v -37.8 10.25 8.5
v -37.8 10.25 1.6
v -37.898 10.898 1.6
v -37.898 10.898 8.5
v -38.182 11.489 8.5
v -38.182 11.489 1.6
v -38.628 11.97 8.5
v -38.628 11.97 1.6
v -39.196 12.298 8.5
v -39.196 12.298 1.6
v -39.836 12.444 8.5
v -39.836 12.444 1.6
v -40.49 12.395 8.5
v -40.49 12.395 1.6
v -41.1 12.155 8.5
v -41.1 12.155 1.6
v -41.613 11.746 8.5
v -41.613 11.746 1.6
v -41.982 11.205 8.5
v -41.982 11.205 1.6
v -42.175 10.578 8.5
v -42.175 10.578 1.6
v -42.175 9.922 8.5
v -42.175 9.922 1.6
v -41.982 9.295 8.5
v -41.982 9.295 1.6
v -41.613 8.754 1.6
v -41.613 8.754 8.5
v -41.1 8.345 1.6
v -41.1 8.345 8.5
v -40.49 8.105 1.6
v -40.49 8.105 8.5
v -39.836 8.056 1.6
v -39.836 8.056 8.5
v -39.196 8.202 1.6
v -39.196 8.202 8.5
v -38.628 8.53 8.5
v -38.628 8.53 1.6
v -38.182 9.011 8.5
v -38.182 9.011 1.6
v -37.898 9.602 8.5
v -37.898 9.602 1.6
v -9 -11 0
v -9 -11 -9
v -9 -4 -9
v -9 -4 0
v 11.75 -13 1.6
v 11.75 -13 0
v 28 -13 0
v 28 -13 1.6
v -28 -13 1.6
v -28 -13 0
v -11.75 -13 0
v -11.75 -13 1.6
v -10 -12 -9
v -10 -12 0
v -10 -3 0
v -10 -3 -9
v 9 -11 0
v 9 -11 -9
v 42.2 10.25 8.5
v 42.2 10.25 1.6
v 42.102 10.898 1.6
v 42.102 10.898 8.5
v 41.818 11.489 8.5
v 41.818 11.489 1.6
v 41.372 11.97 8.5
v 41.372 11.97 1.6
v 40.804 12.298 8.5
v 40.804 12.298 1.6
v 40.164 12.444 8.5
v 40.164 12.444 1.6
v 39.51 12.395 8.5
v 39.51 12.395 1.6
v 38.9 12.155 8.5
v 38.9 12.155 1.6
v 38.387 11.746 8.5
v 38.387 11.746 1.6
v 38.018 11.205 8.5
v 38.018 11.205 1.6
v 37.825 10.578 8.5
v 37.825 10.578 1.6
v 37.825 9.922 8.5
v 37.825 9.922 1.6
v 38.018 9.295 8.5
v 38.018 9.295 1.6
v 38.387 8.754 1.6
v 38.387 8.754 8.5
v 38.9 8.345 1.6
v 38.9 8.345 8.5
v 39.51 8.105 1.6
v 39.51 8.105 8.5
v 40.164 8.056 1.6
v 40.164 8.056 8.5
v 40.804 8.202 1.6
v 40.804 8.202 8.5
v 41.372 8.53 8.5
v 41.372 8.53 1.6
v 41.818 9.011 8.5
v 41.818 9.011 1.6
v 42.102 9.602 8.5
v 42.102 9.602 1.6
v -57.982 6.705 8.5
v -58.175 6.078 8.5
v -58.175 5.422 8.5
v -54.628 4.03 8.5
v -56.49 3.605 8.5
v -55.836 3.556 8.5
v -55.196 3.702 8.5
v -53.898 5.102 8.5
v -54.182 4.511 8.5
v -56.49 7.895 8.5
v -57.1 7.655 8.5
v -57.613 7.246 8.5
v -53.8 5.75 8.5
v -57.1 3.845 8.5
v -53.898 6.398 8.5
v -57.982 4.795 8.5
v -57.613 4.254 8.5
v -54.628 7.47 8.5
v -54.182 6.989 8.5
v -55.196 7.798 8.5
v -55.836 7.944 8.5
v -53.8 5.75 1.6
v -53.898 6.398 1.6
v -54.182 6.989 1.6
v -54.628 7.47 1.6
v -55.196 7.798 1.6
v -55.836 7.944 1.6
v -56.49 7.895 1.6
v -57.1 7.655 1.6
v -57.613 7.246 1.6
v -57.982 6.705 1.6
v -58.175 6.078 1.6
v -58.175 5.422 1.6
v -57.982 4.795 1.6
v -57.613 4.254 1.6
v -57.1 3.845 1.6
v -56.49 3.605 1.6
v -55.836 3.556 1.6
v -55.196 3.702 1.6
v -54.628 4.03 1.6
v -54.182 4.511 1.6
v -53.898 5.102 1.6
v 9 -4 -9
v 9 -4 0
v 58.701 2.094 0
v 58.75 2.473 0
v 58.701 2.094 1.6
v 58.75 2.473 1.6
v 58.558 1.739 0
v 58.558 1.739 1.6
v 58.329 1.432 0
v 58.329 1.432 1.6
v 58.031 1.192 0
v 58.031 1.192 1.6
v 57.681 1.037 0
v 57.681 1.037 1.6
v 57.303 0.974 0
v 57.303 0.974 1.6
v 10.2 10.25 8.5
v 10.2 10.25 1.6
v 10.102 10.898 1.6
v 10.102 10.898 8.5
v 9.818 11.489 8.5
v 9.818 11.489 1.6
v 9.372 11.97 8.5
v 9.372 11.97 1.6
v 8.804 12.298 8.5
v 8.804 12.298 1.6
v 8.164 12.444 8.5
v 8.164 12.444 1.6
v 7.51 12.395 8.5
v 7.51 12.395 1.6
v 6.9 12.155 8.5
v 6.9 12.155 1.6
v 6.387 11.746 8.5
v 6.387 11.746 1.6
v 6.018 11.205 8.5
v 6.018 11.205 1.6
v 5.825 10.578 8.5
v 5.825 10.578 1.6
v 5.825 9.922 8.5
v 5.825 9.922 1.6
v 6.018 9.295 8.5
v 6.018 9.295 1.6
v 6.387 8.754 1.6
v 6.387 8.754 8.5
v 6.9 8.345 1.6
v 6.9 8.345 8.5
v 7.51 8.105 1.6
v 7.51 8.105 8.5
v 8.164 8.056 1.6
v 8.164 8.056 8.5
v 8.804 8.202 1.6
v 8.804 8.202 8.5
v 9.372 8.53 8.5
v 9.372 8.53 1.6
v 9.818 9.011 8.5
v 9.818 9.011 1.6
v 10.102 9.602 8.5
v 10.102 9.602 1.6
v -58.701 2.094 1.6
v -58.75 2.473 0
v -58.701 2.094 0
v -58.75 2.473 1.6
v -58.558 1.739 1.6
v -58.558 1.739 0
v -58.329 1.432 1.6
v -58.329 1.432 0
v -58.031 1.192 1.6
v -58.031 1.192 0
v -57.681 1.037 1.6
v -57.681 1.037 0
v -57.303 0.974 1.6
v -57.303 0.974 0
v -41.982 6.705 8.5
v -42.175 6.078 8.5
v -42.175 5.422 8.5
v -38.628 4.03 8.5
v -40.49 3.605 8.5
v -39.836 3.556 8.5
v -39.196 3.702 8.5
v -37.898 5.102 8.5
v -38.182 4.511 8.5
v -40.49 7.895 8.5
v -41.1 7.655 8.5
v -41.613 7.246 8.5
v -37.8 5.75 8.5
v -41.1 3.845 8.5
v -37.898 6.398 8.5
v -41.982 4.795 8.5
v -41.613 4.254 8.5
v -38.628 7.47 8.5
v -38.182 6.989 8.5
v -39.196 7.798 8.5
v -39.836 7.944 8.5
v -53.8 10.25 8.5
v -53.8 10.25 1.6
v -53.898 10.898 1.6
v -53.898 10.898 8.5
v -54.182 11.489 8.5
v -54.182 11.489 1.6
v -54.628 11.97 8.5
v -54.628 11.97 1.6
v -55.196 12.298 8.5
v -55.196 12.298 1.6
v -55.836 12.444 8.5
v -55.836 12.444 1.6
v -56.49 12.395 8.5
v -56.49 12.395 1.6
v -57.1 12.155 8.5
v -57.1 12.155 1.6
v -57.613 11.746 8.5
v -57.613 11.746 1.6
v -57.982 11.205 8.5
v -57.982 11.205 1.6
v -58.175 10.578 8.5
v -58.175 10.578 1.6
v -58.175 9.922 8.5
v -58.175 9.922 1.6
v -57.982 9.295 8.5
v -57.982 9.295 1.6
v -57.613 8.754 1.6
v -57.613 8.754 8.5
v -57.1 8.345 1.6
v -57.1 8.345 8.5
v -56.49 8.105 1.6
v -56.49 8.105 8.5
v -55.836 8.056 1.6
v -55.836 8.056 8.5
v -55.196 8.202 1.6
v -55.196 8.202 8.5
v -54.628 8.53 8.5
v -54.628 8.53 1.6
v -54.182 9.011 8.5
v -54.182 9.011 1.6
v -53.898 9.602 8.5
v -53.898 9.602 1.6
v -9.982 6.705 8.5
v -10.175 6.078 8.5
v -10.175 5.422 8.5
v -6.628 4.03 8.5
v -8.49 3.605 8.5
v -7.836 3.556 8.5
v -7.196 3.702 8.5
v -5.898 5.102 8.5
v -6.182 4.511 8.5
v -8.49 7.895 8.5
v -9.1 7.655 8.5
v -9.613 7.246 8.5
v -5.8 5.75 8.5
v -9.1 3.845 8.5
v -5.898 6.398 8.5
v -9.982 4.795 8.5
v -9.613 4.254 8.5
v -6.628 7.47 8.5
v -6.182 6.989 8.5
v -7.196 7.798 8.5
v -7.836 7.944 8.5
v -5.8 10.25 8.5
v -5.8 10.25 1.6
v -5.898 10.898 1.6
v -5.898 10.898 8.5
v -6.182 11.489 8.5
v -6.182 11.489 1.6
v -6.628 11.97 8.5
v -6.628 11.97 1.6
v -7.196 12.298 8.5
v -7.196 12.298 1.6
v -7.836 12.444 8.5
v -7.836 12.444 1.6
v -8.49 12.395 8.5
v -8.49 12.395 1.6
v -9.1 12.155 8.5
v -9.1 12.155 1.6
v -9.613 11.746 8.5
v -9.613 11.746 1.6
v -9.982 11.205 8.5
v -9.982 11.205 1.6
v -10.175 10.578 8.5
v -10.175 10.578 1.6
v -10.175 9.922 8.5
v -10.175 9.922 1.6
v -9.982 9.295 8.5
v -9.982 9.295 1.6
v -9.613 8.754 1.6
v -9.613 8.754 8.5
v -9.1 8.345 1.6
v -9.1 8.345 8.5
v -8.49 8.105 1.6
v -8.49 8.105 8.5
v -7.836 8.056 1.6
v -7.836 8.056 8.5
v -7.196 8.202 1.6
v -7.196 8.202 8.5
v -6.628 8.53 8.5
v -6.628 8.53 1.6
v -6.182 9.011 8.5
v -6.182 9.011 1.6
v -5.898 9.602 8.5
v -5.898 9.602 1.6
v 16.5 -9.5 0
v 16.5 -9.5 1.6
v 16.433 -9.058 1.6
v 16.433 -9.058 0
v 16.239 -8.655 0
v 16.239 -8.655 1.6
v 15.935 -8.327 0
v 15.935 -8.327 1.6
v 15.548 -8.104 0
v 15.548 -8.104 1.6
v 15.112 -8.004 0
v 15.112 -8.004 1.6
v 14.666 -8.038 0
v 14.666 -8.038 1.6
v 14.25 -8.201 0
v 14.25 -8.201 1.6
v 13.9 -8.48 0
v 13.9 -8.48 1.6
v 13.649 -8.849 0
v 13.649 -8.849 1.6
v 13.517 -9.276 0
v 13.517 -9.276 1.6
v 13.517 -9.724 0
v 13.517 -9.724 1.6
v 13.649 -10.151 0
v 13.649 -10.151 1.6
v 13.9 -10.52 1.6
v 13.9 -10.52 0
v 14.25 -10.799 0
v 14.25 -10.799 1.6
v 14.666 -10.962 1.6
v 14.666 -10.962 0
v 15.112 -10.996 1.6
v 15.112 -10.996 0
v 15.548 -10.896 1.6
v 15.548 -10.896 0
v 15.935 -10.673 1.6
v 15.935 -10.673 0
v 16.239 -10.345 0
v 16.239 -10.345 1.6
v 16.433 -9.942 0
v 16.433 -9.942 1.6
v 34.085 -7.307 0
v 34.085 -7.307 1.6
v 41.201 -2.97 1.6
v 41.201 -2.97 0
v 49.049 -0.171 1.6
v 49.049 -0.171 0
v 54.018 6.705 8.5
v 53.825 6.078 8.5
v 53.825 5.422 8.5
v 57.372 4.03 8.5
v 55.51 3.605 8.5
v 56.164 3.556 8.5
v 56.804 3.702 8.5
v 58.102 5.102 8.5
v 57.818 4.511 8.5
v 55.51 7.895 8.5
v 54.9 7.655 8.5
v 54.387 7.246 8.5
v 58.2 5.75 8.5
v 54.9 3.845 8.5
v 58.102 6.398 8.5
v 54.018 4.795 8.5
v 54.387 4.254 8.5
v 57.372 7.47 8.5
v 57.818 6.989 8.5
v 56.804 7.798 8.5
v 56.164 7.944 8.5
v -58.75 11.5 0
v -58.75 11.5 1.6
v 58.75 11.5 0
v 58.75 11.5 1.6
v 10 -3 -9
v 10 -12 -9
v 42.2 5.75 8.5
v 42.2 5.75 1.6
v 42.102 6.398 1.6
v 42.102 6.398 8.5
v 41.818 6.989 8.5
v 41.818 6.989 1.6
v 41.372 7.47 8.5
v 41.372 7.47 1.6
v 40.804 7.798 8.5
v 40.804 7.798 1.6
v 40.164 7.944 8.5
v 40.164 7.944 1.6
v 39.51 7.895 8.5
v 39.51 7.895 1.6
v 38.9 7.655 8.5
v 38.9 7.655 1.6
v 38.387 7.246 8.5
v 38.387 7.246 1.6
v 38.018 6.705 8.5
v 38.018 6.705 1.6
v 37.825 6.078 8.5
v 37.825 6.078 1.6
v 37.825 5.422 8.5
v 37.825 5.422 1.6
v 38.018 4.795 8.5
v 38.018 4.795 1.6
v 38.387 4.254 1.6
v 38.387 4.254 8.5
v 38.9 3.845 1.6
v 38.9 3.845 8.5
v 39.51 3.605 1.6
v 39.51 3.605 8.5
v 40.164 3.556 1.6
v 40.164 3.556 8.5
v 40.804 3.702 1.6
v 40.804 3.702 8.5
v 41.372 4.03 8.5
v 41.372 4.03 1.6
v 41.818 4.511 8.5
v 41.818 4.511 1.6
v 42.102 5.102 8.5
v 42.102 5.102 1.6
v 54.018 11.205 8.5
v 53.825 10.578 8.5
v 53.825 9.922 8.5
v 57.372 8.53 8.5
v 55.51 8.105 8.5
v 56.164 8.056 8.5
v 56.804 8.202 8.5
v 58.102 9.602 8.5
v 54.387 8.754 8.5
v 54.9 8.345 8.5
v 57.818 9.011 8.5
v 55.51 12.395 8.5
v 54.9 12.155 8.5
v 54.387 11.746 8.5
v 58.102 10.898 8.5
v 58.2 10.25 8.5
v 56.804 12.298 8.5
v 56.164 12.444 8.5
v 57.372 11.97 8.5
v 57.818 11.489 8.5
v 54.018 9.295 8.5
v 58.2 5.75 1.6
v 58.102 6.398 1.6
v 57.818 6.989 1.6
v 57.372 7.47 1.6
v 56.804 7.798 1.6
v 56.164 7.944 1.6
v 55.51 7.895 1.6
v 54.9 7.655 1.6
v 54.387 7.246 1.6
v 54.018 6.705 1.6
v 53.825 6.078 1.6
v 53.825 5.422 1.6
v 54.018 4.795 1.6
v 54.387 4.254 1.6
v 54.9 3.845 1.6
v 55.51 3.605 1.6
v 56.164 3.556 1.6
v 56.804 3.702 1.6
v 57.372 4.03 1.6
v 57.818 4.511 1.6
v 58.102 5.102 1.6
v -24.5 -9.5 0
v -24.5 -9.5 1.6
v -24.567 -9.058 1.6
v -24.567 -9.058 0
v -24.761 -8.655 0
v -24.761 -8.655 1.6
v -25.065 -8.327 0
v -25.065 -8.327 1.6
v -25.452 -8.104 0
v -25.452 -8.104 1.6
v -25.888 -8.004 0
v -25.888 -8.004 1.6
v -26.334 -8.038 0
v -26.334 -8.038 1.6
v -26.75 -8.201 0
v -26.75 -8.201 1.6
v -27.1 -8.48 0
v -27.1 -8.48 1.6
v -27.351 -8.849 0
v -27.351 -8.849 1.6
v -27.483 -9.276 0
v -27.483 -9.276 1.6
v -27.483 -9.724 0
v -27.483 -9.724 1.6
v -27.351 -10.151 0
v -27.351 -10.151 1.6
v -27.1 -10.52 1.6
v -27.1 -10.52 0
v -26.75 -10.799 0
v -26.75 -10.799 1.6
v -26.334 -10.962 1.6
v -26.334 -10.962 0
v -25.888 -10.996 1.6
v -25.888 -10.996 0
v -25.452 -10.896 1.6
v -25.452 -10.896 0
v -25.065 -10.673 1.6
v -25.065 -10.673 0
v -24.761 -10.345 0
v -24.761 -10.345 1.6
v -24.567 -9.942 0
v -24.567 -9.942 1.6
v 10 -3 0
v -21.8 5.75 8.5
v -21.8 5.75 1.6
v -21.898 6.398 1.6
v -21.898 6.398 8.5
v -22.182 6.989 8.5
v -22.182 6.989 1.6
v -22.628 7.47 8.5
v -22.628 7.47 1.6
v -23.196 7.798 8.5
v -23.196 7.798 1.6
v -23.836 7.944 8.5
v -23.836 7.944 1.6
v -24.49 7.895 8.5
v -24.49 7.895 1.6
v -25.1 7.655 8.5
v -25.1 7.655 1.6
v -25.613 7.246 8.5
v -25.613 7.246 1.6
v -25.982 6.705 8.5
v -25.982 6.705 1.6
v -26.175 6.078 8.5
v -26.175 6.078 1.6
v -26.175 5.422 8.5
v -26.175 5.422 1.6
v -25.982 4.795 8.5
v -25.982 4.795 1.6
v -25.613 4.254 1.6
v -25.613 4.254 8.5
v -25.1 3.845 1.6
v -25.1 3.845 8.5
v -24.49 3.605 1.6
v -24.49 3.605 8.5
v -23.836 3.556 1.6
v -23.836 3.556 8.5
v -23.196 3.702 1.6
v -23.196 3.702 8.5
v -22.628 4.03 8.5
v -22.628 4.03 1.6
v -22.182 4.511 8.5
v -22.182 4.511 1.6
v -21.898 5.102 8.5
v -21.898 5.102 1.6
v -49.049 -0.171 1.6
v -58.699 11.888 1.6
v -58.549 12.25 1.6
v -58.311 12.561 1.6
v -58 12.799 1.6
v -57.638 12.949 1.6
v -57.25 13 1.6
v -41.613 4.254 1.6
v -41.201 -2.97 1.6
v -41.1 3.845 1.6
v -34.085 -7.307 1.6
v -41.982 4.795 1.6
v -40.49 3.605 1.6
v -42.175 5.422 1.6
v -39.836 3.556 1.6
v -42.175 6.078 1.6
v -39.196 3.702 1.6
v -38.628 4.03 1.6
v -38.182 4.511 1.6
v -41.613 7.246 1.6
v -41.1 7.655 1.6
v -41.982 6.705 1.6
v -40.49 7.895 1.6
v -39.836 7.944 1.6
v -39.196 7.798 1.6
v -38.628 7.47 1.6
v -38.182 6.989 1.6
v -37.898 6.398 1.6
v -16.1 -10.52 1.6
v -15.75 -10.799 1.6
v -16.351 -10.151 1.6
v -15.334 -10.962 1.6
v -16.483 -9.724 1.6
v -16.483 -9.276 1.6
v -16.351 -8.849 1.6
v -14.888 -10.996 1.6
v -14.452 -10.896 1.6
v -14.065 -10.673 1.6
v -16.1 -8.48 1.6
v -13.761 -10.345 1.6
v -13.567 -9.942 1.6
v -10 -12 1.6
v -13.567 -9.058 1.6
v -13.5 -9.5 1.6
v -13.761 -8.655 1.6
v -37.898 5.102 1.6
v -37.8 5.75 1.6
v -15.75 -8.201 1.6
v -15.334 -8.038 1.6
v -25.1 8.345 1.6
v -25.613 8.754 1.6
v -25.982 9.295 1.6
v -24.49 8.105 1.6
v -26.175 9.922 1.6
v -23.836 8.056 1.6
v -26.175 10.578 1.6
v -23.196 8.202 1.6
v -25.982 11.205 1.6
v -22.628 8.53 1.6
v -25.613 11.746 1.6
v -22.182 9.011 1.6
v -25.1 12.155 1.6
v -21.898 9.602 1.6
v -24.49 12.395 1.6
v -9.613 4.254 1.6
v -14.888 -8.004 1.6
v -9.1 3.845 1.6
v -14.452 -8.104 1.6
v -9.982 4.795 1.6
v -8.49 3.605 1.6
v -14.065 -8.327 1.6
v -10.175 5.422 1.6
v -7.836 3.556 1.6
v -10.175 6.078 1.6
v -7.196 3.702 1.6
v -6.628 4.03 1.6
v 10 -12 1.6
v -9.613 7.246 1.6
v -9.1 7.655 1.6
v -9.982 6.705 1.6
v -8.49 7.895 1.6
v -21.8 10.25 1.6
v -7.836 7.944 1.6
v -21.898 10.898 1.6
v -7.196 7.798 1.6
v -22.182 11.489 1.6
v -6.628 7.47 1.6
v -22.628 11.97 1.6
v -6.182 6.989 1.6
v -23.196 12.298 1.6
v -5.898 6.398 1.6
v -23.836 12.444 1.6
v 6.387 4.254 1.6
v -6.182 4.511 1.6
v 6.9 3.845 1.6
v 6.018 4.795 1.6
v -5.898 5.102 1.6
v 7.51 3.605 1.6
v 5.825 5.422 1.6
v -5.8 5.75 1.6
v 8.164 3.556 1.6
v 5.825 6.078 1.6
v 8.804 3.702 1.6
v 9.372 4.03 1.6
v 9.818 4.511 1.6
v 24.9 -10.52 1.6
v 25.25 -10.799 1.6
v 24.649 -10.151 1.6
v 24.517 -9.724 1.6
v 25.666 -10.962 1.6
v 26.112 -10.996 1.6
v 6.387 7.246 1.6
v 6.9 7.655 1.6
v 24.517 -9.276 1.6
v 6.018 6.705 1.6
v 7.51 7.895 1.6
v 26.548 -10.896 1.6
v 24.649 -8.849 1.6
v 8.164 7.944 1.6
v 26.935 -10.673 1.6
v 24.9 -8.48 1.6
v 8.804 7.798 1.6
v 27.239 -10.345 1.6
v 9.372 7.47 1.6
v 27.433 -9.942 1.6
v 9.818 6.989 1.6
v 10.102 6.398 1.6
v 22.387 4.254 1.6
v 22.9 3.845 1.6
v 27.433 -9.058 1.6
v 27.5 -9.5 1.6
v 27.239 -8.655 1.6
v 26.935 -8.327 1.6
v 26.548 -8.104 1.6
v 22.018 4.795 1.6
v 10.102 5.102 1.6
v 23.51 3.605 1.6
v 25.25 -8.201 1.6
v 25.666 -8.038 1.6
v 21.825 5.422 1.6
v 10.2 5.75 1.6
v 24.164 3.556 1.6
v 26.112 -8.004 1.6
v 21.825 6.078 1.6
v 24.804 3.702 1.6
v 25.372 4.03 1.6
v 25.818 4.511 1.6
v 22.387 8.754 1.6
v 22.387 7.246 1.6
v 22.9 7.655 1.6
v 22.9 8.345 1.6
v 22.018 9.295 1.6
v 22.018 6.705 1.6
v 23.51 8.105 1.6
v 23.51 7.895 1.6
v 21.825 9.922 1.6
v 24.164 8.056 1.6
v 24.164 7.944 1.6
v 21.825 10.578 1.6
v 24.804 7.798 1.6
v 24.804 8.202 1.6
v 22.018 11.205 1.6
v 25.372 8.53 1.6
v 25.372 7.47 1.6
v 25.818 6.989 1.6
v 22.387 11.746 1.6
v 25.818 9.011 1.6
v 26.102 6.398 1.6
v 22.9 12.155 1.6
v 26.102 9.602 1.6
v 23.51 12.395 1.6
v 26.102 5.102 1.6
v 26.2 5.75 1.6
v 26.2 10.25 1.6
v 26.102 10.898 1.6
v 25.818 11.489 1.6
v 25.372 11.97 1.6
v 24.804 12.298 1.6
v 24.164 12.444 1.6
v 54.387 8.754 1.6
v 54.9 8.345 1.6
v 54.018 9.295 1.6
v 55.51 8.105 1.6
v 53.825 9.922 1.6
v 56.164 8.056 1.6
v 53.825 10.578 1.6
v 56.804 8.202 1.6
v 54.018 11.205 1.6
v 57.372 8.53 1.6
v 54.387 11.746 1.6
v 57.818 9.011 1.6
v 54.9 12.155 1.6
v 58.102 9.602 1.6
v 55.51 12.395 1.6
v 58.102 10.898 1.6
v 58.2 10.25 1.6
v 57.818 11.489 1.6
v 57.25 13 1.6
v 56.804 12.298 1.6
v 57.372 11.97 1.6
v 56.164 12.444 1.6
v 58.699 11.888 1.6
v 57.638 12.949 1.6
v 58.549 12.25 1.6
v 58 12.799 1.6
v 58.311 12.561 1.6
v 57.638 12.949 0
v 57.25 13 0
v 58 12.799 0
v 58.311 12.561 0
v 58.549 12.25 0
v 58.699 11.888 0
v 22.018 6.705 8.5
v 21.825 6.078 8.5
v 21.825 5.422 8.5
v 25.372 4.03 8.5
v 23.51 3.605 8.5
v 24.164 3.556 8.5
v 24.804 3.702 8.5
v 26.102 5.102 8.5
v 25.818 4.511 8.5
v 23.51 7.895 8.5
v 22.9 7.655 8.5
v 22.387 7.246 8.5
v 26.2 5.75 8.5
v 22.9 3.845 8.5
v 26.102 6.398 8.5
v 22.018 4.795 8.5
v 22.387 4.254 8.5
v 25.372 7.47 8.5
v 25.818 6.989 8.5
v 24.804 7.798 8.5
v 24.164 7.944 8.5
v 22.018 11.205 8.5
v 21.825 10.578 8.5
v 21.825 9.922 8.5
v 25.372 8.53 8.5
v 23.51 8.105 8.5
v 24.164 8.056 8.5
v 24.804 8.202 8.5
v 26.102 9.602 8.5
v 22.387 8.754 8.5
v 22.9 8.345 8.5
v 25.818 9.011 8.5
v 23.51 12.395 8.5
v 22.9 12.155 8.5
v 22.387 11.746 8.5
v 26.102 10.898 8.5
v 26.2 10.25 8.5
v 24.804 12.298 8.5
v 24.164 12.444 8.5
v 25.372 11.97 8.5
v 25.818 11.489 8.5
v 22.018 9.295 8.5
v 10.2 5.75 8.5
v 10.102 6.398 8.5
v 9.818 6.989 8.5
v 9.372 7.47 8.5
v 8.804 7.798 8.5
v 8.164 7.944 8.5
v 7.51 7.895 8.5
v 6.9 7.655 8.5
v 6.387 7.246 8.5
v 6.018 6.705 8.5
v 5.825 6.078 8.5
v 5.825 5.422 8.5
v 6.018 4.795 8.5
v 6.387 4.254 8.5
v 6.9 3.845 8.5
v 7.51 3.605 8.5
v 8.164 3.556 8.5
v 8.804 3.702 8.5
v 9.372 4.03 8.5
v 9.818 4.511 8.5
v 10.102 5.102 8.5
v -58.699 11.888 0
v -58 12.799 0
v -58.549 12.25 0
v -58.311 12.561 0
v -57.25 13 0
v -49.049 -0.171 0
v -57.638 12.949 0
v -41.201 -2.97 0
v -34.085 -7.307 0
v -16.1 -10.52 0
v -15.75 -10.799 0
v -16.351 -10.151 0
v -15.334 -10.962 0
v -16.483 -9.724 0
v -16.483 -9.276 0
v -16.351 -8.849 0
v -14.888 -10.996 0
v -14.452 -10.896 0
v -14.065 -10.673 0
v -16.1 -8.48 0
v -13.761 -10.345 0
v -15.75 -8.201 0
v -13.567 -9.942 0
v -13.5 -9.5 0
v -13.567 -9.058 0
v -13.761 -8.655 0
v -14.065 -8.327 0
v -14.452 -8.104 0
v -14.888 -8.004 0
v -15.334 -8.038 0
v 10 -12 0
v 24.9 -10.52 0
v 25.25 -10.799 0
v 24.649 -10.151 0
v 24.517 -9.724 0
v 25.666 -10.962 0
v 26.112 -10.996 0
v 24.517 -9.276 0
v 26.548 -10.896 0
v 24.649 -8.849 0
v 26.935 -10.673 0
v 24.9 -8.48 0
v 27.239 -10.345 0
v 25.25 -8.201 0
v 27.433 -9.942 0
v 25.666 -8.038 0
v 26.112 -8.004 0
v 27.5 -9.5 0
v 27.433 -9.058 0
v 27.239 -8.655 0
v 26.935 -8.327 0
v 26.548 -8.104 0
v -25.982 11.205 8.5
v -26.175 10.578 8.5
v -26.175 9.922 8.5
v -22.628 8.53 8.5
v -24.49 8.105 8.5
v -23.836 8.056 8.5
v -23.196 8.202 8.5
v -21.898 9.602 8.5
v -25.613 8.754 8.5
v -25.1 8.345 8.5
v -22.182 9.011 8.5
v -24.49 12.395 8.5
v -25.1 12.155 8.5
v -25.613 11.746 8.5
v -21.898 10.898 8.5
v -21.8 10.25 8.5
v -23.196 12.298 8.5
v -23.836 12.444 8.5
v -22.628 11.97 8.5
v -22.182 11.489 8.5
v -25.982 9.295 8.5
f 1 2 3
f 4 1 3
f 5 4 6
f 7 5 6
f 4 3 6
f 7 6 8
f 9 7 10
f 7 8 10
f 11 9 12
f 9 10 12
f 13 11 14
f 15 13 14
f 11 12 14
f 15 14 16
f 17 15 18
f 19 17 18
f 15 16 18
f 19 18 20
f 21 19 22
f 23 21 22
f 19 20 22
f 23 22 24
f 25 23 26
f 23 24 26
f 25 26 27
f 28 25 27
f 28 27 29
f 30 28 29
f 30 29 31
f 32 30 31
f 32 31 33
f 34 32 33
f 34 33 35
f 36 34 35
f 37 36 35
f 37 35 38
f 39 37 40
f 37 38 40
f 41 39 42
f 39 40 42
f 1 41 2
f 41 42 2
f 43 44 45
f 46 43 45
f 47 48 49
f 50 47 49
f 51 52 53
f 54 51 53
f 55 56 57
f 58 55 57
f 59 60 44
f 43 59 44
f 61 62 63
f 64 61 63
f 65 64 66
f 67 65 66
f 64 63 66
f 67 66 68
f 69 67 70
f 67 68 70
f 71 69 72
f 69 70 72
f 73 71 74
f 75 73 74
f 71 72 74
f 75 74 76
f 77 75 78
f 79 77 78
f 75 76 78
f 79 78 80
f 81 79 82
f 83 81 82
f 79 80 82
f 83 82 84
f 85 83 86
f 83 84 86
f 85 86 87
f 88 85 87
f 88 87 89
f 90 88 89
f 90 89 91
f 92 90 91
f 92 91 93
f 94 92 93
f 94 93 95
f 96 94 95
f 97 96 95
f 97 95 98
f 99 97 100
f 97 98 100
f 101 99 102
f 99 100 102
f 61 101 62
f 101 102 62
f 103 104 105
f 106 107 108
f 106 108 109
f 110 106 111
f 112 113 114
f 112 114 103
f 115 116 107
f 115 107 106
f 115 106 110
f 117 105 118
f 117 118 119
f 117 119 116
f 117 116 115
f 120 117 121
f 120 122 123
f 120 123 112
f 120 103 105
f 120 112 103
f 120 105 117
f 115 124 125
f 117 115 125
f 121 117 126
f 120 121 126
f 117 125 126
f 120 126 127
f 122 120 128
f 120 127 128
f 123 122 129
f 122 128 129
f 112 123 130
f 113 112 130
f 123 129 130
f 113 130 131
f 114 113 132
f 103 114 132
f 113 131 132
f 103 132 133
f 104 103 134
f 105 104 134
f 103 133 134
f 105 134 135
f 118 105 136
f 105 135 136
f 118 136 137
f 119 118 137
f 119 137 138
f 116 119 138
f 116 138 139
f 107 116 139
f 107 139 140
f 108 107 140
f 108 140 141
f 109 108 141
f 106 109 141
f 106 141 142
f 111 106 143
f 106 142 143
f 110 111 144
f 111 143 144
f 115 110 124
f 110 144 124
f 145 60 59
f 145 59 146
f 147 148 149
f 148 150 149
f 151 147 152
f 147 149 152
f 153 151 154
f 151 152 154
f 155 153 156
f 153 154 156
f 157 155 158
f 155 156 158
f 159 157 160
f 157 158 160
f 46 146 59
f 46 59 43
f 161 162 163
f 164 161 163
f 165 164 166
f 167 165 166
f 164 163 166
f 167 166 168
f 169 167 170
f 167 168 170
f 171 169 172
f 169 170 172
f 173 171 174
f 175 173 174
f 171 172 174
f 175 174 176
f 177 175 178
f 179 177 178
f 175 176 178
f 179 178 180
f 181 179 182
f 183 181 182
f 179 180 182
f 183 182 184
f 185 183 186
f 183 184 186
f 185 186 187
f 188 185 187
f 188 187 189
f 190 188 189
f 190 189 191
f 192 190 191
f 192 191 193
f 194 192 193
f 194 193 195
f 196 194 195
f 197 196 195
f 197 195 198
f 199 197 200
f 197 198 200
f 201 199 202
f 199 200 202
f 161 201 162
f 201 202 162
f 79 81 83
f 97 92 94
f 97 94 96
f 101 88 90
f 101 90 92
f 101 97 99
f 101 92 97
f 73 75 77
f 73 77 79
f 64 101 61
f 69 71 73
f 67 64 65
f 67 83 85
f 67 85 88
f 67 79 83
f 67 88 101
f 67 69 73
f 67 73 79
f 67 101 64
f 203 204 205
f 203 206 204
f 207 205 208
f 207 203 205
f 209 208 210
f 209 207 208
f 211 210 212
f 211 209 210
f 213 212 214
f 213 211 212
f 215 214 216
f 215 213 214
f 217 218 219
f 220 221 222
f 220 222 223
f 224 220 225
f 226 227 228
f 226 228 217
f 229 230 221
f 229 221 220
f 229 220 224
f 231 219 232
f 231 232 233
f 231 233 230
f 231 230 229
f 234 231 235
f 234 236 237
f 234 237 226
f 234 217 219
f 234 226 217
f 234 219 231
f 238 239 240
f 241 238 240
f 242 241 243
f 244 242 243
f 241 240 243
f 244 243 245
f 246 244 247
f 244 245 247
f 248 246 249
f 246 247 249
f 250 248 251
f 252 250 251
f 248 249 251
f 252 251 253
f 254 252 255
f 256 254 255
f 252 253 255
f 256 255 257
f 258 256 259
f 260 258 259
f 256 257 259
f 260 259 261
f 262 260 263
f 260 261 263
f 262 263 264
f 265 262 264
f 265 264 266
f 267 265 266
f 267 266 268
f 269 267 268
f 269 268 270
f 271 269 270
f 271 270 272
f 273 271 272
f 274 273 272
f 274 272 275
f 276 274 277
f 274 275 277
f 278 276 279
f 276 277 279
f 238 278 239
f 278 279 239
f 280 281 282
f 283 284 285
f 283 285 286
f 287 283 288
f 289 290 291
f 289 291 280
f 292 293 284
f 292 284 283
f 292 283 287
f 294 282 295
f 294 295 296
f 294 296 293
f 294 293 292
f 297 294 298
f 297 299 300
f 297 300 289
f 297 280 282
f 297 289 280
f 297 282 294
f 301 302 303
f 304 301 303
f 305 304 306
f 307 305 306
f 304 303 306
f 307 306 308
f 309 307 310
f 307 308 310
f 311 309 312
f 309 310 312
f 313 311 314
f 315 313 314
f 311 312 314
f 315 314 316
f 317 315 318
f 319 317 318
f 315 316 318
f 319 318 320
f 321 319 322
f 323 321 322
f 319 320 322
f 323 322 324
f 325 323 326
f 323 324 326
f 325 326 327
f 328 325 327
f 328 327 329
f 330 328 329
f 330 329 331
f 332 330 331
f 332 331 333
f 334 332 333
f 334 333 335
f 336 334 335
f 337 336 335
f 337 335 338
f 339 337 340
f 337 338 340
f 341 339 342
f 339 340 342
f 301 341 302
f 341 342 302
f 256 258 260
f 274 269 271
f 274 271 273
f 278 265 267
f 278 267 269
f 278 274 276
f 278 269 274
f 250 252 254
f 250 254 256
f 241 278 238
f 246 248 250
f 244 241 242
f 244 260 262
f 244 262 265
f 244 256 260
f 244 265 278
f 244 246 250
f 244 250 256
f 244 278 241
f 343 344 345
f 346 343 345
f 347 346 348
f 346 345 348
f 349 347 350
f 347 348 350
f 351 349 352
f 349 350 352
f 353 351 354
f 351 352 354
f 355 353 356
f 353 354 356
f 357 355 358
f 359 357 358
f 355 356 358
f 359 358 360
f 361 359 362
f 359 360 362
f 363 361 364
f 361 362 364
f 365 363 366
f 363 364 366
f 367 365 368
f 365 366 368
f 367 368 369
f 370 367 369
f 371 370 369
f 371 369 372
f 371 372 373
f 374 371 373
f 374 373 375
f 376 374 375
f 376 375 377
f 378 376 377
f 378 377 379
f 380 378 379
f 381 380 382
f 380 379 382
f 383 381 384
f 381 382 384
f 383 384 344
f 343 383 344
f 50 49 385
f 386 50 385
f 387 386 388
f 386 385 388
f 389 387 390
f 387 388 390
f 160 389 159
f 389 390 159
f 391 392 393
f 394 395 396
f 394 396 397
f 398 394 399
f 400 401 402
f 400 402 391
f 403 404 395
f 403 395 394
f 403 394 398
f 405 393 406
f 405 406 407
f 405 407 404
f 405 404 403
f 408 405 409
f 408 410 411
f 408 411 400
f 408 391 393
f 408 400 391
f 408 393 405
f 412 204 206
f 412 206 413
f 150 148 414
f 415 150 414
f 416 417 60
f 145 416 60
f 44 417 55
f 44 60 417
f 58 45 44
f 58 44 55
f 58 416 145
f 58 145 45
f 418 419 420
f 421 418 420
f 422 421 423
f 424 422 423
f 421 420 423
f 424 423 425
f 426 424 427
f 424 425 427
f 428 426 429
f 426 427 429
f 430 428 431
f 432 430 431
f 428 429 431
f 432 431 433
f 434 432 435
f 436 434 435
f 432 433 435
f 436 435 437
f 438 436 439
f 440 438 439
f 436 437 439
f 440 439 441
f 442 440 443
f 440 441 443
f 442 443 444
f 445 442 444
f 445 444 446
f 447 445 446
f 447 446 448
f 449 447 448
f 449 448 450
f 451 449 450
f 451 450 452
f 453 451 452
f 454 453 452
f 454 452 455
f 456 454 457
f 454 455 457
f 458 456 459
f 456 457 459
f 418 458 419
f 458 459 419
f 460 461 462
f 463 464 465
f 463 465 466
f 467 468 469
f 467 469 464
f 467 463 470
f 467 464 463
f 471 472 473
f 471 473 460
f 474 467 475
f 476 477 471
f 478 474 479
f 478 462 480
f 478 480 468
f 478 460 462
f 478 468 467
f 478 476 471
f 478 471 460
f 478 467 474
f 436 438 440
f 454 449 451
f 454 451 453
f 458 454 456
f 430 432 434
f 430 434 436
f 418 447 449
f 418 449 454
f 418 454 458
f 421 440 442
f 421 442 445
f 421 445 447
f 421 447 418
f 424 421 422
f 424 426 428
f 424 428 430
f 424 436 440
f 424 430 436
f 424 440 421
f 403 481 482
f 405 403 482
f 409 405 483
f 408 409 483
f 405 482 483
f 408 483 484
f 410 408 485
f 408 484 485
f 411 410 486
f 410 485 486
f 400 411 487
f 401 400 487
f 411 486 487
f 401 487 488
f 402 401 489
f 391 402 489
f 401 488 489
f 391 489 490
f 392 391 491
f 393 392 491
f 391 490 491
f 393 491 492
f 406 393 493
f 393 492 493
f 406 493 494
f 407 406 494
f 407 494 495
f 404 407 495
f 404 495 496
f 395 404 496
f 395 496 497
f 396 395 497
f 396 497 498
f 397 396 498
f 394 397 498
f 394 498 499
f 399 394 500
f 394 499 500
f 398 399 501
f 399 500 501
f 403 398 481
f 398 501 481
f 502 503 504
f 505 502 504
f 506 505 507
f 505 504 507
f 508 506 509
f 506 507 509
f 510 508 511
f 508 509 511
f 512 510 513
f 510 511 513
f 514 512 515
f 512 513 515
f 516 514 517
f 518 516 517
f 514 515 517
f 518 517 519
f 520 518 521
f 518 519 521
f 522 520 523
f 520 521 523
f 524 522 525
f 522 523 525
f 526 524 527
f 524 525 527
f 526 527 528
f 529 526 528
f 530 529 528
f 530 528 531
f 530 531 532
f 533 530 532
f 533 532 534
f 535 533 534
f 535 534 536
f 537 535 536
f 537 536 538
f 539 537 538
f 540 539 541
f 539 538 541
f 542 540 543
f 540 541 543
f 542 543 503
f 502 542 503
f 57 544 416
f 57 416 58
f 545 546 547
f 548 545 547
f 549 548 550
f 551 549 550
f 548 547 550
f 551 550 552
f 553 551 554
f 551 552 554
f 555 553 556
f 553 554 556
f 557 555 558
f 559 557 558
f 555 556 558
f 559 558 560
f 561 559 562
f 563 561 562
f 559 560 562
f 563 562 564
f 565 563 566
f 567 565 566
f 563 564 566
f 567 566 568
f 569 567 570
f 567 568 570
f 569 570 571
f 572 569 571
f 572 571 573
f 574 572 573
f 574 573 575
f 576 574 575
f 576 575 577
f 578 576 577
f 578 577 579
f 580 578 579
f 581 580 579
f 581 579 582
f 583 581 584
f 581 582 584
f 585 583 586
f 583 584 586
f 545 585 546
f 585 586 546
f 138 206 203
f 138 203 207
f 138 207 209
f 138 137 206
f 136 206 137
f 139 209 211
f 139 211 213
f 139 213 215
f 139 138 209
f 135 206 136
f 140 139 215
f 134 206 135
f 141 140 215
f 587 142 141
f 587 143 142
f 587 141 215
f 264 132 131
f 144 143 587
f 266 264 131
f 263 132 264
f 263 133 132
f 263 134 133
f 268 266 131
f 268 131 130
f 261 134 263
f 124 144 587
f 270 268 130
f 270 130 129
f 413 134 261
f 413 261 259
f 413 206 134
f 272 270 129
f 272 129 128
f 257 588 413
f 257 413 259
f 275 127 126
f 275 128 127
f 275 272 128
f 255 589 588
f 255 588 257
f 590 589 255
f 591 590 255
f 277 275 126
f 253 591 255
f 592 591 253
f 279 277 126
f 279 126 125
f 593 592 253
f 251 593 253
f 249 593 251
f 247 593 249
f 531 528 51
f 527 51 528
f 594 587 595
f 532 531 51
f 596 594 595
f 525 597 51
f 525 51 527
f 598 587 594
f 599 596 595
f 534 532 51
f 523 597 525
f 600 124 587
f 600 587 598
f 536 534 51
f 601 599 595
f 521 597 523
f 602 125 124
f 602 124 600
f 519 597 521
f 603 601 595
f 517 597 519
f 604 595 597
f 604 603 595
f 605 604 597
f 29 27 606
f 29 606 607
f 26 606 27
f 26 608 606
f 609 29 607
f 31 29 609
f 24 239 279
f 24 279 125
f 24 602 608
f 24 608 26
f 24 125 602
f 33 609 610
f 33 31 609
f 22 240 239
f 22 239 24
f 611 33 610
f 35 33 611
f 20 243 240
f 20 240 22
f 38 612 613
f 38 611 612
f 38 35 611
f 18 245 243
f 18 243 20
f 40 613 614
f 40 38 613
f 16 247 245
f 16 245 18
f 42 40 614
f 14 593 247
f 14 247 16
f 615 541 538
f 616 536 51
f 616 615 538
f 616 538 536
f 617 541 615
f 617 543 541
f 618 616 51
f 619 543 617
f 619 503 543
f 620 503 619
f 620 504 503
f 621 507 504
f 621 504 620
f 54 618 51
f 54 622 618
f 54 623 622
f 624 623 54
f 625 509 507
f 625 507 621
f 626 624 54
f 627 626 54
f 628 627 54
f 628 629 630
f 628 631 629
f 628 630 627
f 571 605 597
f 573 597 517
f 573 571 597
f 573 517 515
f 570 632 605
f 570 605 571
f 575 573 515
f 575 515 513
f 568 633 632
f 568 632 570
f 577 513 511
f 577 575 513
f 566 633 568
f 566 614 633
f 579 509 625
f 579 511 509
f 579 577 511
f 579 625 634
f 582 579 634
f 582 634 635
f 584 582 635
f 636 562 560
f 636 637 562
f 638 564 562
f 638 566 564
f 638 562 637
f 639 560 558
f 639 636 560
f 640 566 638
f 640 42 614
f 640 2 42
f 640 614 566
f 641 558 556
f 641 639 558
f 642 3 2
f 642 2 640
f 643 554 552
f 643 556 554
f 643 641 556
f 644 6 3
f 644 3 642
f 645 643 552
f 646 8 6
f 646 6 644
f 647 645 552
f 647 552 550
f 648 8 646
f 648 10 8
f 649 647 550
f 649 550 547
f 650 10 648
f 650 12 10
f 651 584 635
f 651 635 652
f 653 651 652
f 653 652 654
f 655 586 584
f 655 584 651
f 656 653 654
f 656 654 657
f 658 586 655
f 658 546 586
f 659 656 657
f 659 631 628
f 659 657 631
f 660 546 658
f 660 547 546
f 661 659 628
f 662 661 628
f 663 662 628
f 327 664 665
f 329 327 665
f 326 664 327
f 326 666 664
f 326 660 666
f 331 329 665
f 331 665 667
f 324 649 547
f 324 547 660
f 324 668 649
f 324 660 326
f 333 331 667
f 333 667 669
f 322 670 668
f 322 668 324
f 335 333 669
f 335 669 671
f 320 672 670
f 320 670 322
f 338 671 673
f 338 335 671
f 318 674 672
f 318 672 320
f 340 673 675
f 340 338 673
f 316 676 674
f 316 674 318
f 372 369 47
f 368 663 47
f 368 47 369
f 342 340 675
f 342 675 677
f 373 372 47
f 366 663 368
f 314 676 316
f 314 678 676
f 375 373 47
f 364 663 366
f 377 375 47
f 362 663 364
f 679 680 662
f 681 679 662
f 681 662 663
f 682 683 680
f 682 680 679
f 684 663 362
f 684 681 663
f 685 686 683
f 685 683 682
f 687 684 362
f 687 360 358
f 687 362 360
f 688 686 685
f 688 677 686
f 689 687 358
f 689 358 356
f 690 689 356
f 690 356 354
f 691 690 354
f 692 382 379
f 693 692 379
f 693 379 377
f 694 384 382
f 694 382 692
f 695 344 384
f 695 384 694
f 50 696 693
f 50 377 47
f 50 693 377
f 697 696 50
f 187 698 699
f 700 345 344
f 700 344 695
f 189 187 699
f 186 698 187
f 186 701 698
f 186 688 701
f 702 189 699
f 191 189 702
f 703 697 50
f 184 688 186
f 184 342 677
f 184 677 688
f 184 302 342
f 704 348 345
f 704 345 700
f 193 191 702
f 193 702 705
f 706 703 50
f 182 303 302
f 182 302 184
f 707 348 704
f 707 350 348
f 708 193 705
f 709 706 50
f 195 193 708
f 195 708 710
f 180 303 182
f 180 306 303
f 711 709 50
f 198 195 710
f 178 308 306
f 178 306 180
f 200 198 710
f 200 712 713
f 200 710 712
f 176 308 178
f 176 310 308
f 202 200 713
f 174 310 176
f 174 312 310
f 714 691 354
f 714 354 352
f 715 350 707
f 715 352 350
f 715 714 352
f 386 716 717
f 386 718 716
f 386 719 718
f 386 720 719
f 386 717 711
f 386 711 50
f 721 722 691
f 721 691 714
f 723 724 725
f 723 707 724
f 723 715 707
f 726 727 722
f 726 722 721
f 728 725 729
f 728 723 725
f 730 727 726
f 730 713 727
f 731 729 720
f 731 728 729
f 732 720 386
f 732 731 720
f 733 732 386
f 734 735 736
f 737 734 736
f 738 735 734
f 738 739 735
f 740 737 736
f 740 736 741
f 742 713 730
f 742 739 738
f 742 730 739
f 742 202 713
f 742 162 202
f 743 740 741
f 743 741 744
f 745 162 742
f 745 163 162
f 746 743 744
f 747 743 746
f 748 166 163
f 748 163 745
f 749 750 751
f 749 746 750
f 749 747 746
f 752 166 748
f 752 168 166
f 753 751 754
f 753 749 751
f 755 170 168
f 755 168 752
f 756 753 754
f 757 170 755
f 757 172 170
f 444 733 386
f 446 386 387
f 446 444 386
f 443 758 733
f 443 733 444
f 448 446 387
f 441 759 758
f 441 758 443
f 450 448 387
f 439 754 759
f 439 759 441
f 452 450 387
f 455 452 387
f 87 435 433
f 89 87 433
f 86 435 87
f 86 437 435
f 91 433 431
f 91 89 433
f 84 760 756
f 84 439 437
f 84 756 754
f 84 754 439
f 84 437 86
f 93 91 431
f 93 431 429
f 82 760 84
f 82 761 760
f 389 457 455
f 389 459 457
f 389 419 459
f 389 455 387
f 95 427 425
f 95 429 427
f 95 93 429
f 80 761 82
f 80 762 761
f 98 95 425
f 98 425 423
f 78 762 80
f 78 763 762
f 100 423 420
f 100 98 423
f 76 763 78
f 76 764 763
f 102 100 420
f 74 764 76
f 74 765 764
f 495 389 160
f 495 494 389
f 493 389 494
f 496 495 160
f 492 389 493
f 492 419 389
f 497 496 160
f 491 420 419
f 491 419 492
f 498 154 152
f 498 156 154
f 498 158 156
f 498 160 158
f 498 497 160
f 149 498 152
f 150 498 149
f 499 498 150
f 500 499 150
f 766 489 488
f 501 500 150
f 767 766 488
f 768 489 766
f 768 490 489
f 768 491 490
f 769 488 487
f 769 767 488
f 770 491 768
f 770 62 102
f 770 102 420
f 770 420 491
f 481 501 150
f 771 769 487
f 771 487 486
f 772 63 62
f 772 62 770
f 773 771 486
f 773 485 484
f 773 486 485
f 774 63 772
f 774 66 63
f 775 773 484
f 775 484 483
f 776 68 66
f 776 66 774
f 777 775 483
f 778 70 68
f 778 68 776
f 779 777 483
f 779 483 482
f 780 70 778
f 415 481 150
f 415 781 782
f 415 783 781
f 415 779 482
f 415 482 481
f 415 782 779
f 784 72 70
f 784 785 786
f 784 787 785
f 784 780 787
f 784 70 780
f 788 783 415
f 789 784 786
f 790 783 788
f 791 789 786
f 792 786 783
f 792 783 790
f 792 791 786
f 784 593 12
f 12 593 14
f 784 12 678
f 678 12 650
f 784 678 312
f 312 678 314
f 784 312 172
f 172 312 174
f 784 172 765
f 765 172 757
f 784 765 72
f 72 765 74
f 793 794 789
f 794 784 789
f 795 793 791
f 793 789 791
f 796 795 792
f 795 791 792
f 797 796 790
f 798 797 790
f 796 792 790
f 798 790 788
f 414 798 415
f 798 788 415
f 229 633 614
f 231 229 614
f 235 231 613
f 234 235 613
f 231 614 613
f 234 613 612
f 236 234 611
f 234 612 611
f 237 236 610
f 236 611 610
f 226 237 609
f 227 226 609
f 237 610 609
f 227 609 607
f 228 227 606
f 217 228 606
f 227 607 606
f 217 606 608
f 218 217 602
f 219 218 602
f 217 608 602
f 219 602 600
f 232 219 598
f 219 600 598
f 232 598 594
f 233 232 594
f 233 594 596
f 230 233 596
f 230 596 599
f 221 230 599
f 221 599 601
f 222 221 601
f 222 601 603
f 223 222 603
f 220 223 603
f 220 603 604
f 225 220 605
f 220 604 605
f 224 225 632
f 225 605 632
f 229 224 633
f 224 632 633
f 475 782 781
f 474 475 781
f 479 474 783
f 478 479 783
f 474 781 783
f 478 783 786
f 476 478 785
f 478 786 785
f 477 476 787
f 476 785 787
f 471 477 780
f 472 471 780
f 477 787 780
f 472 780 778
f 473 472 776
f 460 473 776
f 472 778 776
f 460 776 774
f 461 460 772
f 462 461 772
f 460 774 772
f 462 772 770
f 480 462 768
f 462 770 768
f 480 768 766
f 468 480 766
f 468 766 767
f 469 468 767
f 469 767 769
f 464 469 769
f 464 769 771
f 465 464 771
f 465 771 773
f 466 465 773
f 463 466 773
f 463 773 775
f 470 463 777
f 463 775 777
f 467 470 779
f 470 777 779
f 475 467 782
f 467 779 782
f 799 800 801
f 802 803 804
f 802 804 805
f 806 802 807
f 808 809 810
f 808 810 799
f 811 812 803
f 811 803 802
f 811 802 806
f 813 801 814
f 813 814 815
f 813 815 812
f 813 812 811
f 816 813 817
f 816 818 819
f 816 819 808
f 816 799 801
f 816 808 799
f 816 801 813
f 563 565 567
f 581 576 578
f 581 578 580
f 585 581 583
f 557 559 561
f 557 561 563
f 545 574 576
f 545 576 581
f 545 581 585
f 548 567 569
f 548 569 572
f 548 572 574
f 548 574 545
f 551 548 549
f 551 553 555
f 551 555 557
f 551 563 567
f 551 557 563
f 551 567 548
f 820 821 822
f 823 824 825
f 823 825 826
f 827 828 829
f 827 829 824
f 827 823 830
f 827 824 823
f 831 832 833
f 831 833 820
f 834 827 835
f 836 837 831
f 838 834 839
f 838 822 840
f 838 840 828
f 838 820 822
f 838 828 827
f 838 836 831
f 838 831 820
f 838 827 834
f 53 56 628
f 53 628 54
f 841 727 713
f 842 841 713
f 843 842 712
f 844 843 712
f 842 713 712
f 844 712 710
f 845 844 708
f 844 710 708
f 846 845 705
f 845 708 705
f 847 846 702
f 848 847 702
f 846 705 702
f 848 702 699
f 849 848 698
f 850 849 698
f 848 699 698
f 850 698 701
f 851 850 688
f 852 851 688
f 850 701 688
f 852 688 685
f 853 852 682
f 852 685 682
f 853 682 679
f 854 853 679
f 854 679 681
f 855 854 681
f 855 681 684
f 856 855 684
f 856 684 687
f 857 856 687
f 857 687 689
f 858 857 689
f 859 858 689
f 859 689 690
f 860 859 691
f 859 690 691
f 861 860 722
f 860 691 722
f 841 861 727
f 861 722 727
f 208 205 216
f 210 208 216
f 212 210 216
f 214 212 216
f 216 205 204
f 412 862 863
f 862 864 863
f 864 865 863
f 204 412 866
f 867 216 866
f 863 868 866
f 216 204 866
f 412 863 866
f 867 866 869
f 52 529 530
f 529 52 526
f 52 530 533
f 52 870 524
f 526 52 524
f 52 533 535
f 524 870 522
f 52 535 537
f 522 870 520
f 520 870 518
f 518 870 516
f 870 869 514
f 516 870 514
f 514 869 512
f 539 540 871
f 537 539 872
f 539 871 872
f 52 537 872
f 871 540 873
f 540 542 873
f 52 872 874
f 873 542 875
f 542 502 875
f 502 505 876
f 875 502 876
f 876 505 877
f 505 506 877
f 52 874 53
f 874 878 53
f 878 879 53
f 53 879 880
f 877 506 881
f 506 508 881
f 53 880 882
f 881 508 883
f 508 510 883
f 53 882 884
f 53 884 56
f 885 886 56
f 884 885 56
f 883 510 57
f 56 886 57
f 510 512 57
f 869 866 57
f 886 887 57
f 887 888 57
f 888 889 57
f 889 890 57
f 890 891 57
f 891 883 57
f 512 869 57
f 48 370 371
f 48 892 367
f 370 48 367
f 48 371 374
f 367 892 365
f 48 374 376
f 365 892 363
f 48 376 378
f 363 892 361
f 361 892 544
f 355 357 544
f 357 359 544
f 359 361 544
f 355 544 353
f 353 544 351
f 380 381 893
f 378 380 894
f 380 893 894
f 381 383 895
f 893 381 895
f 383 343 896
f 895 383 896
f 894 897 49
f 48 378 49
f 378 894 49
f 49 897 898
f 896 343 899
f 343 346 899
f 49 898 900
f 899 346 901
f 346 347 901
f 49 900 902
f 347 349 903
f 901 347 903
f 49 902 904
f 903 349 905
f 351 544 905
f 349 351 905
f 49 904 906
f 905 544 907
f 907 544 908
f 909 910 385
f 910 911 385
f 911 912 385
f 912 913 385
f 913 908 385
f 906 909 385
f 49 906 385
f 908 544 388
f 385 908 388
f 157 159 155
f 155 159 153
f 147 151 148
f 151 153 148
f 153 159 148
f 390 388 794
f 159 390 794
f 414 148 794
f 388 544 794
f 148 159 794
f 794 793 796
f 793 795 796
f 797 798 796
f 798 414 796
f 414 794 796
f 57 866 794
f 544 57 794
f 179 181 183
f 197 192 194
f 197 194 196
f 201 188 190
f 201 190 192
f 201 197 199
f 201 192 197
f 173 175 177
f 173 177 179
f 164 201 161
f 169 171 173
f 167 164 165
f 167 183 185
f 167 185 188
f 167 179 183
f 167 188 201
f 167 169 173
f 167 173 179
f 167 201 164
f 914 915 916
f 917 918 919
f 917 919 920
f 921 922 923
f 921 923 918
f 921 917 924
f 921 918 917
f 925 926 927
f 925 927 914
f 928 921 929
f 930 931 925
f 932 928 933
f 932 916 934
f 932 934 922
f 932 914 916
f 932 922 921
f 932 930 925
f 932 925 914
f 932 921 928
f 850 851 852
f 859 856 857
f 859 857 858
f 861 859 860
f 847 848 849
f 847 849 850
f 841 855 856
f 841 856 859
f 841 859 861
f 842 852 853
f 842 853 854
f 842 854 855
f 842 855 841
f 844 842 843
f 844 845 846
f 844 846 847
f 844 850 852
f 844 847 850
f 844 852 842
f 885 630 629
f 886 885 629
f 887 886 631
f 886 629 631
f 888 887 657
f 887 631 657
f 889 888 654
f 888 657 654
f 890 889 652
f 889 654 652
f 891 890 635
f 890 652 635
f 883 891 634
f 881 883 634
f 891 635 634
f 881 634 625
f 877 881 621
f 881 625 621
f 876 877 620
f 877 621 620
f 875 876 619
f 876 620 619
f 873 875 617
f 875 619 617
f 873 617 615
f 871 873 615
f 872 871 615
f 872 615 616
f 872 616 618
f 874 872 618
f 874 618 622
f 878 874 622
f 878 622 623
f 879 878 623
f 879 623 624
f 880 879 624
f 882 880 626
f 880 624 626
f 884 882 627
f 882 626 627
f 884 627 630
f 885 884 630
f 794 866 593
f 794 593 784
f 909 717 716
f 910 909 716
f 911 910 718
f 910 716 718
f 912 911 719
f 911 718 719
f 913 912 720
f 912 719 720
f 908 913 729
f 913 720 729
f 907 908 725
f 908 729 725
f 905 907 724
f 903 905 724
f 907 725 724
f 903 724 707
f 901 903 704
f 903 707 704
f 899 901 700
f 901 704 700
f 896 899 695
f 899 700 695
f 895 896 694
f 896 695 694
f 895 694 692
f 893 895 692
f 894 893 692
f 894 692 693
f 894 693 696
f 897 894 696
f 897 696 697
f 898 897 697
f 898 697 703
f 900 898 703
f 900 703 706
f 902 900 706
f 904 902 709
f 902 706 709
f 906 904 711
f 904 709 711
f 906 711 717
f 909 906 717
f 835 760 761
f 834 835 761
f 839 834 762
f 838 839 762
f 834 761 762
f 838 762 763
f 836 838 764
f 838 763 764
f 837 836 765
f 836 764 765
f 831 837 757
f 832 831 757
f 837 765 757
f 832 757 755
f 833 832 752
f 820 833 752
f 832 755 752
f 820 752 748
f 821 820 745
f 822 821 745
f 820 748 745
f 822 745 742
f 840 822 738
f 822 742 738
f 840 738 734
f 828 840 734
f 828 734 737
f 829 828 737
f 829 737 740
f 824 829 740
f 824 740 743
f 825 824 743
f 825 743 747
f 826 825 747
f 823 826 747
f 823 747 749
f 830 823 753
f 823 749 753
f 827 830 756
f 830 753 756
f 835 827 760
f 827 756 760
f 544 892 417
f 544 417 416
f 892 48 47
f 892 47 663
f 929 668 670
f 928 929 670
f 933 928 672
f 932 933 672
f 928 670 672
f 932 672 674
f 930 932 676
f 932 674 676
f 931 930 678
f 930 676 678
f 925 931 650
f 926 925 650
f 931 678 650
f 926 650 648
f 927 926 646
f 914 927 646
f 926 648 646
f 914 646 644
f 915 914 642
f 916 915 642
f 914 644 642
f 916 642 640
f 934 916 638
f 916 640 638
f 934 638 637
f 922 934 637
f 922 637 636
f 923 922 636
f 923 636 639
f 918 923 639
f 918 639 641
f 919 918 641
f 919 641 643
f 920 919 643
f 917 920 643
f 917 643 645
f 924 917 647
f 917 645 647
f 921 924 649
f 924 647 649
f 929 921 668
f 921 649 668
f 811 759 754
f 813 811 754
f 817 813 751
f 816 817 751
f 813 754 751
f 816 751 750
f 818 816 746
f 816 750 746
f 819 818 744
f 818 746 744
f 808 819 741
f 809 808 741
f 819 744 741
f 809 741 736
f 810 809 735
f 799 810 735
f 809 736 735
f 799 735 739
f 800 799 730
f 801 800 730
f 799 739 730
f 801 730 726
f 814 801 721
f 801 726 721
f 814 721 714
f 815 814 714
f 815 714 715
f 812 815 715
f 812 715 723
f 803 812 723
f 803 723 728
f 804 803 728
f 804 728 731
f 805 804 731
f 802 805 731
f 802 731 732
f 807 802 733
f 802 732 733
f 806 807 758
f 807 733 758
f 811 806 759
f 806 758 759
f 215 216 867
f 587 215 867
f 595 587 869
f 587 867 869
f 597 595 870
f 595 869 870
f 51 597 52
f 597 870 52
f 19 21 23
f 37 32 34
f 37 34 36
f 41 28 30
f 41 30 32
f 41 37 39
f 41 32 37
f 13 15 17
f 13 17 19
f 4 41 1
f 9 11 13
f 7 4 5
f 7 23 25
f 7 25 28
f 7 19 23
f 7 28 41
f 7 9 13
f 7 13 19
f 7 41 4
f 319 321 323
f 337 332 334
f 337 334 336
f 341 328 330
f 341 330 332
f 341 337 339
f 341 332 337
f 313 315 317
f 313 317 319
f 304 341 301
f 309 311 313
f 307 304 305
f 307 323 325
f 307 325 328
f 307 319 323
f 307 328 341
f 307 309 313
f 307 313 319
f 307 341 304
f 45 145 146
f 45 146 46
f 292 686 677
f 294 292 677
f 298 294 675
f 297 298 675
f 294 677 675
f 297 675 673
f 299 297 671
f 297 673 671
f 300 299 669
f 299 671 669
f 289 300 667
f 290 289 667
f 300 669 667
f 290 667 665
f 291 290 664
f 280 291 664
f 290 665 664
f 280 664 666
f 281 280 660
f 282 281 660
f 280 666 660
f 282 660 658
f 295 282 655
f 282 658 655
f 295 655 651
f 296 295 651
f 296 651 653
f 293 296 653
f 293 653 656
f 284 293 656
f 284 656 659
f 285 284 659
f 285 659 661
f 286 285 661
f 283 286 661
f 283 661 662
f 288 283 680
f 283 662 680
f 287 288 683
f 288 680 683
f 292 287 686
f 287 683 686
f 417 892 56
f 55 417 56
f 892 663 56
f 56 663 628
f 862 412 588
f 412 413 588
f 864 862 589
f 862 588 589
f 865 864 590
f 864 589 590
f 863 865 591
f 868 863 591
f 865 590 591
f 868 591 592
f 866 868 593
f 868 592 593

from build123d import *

# Parameters (mm, degrees)
SKETCH_1_W          = 117.5
SKETCH_1_H          = 26
EXTRUDE_1_DEPTH     = 1.6
SKETCH_2_R          = 2.2
EXTRUDE_4_DEPTH     = 6.9
SKETCH_3_R          = 1.5
CUT_EXTRUDE_2_DEPTH = 1.6
CUT_EXTRUDE_3_DEPTH = 1.6
SKETCH_5_W          = 20
SKETCH_5_H          = 9
EXTRUDE_5_DEPTH     = 9
SKETCH_6_W          = 18
SKETCH_6_H          = 7
CUT_EXTRUDE_4_DEPTH = 9
FILLET_1_R          = 1.5
CUT_EXTRUDE_5_DEPTH = 1.6
FILLET_2_R          = 1.5


with BuildPart() as part:
    # 草图1 → 凸台-拉伸1 (new body)
    with BuildSketch(Plane.XY):
        Rectangle(SKETCH_1_W, SKETCH_1_H)
    extrude(amount=EXTRUDE_1_DEPTH)

    # 草图2 → 凸台-拉伸4 (add)
    with BuildSketch(Plane.XY.offset(1.6)):
        with Locations((8, 10.25)):
            Circle(SKETCH_2_R)
        with Locations((8, 5.75)):
            Circle(SKETCH_2_R)
        with Locations((24, 10.25)):
            Circle(SKETCH_2_R)
        with Locations((24, 5.75)):
            Circle(SKETCH_2_R)
        with Locations((40, 10.25)):
            Circle(SKETCH_2_R)
        with Locations((40, 5.75)):
            Circle(SKETCH_2_R)
        with Locations((56, 10.25)):
            Circle(SKETCH_2_R)
        with Locations((56, 5.75)):
            Circle(SKETCH_2_R)
        with Locations((-8, 5.75)):
            Circle(SKETCH_2_R)
        with Locations((-8, 10.25)):
            Circle(SKETCH_2_R)
        with Locations((-24, 5.75)):
            Circle(SKETCH_2_R)
        with Locations((-24, 10.25)):
            Circle(SKETCH_2_R)
        with Locations((-40, 5.75)):
            Circle(SKETCH_2_R)
        with Locations((-40, 10.25)):
            Circle(SKETCH_2_R)
        with Locations((-56, 5.75)):
            Circle(SKETCH_2_R)
        with Locations((-56, 10.25)):
            Circle(SKETCH_2_R)
    extrude(amount=EXTRUDE_4_DEPTH)

    # 草图3 → 切除-拉伸2 (cut)
    with BuildSketch(Plane.XY.offset(1.6)):
        with Locations((-15, -9.5)):
            Circle(SKETCH_3_R)
        with Locations((15, -9.5)):
            Circle(SKETCH_3_R)
        with Locations((26, -9.5)):
            Circle(SKETCH_3_R)
        with Locations((-26, -9.5)):
            Circle(SKETCH_3_R)
    extrude(amount=-CUT_EXTRUDE_2_DEPTH, mode=Mode.SUBTRACT)

    # 草图4 → 切除-拉伸3 (cut)
    with BuildSketch(Plane(origin=(0, 0, 0), x_dir=(-1, 0, 0), z_dir=(0, 0, -1))):
        Polygon((-10, -12), (10, -12), (11.75, -13), (0, -13), (-11.75, -13), align=None)
    extrude(amount=-CUT_EXTRUDE_3_DEPTH, mode=Mode.SUBTRACT)

    # 草图5 → 凸台-拉伸5 (add)
    with BuildSketch(Plane(origin=(0, 0, 0), x_dir=(-1, 0, 0), z_dir=(0, 0, -1))):
        with Locations((0, -7.5)):
            Rectangle(SKETCH_5_W, SKETCH_5_H)
    extrude(amount=EXTRUDE_5_DEPTH)

    # 草图6 → 切除-拉伸4 (cut)
    with BuildSketch(Plane(origin=(0, 0, -9), x_dir=(-1, 0, 0), z_dir=(0, 0, -1))):
        with Locations((0, -7.5)):
            Rectangle(SKETCH_6_W, SKETCH_6_H)
    extrude(amount=-CUT_EXTRUDE_4_DEPTH, mode=Mode.SUBTRACT)

    # 圆角1
    fillet_1_edges = [part.edges().sort_by_distance(p)[0] for p in [
        (-58.75, 13, 0.8),
        (58.75, 13, 0.8),
    ]]
    fillet(fillet_1_edges, radius=FILLET_1_R)

    # 草图7 → 切除-拉伸5 (cut)
    with BuildSketch(Plane(origin=(0, 0, 0), x_dir=(-1, 0, 0), z_dir=(0, 0, -1))):
        with BuildLine():
            Line((28, -13), (58.75, -13))
            Line((58.75, -13), (58.75, 1))
            ThreePointArc((58.75, 1), (41.856491631, -2.664704833), (28, -13))
        make_face()
        with BuildLine():
            Line((-58.75, 1), (-58.75, -13))
            Line((-58.75, -13), (-28, -13))
            ThreePointArc((-28, -13), (-41.856491631, -2.664704833), (-58.75, 1))
        make_face()
    extrude(amount=-CUT_EXTRUDE_5_DEPTH, mode=Mode.SUBTRACT)

    # 圆角2
    fillet_2_edges = [part.edges().sort_by_distance(p)[0] for p in [
        (-58.75, 1, 0.8),
        (58.75, 1, 0.8),
    ]]
    fillet(fillet_2_edges, radius=FILLET_2_R)


solid = part.part
